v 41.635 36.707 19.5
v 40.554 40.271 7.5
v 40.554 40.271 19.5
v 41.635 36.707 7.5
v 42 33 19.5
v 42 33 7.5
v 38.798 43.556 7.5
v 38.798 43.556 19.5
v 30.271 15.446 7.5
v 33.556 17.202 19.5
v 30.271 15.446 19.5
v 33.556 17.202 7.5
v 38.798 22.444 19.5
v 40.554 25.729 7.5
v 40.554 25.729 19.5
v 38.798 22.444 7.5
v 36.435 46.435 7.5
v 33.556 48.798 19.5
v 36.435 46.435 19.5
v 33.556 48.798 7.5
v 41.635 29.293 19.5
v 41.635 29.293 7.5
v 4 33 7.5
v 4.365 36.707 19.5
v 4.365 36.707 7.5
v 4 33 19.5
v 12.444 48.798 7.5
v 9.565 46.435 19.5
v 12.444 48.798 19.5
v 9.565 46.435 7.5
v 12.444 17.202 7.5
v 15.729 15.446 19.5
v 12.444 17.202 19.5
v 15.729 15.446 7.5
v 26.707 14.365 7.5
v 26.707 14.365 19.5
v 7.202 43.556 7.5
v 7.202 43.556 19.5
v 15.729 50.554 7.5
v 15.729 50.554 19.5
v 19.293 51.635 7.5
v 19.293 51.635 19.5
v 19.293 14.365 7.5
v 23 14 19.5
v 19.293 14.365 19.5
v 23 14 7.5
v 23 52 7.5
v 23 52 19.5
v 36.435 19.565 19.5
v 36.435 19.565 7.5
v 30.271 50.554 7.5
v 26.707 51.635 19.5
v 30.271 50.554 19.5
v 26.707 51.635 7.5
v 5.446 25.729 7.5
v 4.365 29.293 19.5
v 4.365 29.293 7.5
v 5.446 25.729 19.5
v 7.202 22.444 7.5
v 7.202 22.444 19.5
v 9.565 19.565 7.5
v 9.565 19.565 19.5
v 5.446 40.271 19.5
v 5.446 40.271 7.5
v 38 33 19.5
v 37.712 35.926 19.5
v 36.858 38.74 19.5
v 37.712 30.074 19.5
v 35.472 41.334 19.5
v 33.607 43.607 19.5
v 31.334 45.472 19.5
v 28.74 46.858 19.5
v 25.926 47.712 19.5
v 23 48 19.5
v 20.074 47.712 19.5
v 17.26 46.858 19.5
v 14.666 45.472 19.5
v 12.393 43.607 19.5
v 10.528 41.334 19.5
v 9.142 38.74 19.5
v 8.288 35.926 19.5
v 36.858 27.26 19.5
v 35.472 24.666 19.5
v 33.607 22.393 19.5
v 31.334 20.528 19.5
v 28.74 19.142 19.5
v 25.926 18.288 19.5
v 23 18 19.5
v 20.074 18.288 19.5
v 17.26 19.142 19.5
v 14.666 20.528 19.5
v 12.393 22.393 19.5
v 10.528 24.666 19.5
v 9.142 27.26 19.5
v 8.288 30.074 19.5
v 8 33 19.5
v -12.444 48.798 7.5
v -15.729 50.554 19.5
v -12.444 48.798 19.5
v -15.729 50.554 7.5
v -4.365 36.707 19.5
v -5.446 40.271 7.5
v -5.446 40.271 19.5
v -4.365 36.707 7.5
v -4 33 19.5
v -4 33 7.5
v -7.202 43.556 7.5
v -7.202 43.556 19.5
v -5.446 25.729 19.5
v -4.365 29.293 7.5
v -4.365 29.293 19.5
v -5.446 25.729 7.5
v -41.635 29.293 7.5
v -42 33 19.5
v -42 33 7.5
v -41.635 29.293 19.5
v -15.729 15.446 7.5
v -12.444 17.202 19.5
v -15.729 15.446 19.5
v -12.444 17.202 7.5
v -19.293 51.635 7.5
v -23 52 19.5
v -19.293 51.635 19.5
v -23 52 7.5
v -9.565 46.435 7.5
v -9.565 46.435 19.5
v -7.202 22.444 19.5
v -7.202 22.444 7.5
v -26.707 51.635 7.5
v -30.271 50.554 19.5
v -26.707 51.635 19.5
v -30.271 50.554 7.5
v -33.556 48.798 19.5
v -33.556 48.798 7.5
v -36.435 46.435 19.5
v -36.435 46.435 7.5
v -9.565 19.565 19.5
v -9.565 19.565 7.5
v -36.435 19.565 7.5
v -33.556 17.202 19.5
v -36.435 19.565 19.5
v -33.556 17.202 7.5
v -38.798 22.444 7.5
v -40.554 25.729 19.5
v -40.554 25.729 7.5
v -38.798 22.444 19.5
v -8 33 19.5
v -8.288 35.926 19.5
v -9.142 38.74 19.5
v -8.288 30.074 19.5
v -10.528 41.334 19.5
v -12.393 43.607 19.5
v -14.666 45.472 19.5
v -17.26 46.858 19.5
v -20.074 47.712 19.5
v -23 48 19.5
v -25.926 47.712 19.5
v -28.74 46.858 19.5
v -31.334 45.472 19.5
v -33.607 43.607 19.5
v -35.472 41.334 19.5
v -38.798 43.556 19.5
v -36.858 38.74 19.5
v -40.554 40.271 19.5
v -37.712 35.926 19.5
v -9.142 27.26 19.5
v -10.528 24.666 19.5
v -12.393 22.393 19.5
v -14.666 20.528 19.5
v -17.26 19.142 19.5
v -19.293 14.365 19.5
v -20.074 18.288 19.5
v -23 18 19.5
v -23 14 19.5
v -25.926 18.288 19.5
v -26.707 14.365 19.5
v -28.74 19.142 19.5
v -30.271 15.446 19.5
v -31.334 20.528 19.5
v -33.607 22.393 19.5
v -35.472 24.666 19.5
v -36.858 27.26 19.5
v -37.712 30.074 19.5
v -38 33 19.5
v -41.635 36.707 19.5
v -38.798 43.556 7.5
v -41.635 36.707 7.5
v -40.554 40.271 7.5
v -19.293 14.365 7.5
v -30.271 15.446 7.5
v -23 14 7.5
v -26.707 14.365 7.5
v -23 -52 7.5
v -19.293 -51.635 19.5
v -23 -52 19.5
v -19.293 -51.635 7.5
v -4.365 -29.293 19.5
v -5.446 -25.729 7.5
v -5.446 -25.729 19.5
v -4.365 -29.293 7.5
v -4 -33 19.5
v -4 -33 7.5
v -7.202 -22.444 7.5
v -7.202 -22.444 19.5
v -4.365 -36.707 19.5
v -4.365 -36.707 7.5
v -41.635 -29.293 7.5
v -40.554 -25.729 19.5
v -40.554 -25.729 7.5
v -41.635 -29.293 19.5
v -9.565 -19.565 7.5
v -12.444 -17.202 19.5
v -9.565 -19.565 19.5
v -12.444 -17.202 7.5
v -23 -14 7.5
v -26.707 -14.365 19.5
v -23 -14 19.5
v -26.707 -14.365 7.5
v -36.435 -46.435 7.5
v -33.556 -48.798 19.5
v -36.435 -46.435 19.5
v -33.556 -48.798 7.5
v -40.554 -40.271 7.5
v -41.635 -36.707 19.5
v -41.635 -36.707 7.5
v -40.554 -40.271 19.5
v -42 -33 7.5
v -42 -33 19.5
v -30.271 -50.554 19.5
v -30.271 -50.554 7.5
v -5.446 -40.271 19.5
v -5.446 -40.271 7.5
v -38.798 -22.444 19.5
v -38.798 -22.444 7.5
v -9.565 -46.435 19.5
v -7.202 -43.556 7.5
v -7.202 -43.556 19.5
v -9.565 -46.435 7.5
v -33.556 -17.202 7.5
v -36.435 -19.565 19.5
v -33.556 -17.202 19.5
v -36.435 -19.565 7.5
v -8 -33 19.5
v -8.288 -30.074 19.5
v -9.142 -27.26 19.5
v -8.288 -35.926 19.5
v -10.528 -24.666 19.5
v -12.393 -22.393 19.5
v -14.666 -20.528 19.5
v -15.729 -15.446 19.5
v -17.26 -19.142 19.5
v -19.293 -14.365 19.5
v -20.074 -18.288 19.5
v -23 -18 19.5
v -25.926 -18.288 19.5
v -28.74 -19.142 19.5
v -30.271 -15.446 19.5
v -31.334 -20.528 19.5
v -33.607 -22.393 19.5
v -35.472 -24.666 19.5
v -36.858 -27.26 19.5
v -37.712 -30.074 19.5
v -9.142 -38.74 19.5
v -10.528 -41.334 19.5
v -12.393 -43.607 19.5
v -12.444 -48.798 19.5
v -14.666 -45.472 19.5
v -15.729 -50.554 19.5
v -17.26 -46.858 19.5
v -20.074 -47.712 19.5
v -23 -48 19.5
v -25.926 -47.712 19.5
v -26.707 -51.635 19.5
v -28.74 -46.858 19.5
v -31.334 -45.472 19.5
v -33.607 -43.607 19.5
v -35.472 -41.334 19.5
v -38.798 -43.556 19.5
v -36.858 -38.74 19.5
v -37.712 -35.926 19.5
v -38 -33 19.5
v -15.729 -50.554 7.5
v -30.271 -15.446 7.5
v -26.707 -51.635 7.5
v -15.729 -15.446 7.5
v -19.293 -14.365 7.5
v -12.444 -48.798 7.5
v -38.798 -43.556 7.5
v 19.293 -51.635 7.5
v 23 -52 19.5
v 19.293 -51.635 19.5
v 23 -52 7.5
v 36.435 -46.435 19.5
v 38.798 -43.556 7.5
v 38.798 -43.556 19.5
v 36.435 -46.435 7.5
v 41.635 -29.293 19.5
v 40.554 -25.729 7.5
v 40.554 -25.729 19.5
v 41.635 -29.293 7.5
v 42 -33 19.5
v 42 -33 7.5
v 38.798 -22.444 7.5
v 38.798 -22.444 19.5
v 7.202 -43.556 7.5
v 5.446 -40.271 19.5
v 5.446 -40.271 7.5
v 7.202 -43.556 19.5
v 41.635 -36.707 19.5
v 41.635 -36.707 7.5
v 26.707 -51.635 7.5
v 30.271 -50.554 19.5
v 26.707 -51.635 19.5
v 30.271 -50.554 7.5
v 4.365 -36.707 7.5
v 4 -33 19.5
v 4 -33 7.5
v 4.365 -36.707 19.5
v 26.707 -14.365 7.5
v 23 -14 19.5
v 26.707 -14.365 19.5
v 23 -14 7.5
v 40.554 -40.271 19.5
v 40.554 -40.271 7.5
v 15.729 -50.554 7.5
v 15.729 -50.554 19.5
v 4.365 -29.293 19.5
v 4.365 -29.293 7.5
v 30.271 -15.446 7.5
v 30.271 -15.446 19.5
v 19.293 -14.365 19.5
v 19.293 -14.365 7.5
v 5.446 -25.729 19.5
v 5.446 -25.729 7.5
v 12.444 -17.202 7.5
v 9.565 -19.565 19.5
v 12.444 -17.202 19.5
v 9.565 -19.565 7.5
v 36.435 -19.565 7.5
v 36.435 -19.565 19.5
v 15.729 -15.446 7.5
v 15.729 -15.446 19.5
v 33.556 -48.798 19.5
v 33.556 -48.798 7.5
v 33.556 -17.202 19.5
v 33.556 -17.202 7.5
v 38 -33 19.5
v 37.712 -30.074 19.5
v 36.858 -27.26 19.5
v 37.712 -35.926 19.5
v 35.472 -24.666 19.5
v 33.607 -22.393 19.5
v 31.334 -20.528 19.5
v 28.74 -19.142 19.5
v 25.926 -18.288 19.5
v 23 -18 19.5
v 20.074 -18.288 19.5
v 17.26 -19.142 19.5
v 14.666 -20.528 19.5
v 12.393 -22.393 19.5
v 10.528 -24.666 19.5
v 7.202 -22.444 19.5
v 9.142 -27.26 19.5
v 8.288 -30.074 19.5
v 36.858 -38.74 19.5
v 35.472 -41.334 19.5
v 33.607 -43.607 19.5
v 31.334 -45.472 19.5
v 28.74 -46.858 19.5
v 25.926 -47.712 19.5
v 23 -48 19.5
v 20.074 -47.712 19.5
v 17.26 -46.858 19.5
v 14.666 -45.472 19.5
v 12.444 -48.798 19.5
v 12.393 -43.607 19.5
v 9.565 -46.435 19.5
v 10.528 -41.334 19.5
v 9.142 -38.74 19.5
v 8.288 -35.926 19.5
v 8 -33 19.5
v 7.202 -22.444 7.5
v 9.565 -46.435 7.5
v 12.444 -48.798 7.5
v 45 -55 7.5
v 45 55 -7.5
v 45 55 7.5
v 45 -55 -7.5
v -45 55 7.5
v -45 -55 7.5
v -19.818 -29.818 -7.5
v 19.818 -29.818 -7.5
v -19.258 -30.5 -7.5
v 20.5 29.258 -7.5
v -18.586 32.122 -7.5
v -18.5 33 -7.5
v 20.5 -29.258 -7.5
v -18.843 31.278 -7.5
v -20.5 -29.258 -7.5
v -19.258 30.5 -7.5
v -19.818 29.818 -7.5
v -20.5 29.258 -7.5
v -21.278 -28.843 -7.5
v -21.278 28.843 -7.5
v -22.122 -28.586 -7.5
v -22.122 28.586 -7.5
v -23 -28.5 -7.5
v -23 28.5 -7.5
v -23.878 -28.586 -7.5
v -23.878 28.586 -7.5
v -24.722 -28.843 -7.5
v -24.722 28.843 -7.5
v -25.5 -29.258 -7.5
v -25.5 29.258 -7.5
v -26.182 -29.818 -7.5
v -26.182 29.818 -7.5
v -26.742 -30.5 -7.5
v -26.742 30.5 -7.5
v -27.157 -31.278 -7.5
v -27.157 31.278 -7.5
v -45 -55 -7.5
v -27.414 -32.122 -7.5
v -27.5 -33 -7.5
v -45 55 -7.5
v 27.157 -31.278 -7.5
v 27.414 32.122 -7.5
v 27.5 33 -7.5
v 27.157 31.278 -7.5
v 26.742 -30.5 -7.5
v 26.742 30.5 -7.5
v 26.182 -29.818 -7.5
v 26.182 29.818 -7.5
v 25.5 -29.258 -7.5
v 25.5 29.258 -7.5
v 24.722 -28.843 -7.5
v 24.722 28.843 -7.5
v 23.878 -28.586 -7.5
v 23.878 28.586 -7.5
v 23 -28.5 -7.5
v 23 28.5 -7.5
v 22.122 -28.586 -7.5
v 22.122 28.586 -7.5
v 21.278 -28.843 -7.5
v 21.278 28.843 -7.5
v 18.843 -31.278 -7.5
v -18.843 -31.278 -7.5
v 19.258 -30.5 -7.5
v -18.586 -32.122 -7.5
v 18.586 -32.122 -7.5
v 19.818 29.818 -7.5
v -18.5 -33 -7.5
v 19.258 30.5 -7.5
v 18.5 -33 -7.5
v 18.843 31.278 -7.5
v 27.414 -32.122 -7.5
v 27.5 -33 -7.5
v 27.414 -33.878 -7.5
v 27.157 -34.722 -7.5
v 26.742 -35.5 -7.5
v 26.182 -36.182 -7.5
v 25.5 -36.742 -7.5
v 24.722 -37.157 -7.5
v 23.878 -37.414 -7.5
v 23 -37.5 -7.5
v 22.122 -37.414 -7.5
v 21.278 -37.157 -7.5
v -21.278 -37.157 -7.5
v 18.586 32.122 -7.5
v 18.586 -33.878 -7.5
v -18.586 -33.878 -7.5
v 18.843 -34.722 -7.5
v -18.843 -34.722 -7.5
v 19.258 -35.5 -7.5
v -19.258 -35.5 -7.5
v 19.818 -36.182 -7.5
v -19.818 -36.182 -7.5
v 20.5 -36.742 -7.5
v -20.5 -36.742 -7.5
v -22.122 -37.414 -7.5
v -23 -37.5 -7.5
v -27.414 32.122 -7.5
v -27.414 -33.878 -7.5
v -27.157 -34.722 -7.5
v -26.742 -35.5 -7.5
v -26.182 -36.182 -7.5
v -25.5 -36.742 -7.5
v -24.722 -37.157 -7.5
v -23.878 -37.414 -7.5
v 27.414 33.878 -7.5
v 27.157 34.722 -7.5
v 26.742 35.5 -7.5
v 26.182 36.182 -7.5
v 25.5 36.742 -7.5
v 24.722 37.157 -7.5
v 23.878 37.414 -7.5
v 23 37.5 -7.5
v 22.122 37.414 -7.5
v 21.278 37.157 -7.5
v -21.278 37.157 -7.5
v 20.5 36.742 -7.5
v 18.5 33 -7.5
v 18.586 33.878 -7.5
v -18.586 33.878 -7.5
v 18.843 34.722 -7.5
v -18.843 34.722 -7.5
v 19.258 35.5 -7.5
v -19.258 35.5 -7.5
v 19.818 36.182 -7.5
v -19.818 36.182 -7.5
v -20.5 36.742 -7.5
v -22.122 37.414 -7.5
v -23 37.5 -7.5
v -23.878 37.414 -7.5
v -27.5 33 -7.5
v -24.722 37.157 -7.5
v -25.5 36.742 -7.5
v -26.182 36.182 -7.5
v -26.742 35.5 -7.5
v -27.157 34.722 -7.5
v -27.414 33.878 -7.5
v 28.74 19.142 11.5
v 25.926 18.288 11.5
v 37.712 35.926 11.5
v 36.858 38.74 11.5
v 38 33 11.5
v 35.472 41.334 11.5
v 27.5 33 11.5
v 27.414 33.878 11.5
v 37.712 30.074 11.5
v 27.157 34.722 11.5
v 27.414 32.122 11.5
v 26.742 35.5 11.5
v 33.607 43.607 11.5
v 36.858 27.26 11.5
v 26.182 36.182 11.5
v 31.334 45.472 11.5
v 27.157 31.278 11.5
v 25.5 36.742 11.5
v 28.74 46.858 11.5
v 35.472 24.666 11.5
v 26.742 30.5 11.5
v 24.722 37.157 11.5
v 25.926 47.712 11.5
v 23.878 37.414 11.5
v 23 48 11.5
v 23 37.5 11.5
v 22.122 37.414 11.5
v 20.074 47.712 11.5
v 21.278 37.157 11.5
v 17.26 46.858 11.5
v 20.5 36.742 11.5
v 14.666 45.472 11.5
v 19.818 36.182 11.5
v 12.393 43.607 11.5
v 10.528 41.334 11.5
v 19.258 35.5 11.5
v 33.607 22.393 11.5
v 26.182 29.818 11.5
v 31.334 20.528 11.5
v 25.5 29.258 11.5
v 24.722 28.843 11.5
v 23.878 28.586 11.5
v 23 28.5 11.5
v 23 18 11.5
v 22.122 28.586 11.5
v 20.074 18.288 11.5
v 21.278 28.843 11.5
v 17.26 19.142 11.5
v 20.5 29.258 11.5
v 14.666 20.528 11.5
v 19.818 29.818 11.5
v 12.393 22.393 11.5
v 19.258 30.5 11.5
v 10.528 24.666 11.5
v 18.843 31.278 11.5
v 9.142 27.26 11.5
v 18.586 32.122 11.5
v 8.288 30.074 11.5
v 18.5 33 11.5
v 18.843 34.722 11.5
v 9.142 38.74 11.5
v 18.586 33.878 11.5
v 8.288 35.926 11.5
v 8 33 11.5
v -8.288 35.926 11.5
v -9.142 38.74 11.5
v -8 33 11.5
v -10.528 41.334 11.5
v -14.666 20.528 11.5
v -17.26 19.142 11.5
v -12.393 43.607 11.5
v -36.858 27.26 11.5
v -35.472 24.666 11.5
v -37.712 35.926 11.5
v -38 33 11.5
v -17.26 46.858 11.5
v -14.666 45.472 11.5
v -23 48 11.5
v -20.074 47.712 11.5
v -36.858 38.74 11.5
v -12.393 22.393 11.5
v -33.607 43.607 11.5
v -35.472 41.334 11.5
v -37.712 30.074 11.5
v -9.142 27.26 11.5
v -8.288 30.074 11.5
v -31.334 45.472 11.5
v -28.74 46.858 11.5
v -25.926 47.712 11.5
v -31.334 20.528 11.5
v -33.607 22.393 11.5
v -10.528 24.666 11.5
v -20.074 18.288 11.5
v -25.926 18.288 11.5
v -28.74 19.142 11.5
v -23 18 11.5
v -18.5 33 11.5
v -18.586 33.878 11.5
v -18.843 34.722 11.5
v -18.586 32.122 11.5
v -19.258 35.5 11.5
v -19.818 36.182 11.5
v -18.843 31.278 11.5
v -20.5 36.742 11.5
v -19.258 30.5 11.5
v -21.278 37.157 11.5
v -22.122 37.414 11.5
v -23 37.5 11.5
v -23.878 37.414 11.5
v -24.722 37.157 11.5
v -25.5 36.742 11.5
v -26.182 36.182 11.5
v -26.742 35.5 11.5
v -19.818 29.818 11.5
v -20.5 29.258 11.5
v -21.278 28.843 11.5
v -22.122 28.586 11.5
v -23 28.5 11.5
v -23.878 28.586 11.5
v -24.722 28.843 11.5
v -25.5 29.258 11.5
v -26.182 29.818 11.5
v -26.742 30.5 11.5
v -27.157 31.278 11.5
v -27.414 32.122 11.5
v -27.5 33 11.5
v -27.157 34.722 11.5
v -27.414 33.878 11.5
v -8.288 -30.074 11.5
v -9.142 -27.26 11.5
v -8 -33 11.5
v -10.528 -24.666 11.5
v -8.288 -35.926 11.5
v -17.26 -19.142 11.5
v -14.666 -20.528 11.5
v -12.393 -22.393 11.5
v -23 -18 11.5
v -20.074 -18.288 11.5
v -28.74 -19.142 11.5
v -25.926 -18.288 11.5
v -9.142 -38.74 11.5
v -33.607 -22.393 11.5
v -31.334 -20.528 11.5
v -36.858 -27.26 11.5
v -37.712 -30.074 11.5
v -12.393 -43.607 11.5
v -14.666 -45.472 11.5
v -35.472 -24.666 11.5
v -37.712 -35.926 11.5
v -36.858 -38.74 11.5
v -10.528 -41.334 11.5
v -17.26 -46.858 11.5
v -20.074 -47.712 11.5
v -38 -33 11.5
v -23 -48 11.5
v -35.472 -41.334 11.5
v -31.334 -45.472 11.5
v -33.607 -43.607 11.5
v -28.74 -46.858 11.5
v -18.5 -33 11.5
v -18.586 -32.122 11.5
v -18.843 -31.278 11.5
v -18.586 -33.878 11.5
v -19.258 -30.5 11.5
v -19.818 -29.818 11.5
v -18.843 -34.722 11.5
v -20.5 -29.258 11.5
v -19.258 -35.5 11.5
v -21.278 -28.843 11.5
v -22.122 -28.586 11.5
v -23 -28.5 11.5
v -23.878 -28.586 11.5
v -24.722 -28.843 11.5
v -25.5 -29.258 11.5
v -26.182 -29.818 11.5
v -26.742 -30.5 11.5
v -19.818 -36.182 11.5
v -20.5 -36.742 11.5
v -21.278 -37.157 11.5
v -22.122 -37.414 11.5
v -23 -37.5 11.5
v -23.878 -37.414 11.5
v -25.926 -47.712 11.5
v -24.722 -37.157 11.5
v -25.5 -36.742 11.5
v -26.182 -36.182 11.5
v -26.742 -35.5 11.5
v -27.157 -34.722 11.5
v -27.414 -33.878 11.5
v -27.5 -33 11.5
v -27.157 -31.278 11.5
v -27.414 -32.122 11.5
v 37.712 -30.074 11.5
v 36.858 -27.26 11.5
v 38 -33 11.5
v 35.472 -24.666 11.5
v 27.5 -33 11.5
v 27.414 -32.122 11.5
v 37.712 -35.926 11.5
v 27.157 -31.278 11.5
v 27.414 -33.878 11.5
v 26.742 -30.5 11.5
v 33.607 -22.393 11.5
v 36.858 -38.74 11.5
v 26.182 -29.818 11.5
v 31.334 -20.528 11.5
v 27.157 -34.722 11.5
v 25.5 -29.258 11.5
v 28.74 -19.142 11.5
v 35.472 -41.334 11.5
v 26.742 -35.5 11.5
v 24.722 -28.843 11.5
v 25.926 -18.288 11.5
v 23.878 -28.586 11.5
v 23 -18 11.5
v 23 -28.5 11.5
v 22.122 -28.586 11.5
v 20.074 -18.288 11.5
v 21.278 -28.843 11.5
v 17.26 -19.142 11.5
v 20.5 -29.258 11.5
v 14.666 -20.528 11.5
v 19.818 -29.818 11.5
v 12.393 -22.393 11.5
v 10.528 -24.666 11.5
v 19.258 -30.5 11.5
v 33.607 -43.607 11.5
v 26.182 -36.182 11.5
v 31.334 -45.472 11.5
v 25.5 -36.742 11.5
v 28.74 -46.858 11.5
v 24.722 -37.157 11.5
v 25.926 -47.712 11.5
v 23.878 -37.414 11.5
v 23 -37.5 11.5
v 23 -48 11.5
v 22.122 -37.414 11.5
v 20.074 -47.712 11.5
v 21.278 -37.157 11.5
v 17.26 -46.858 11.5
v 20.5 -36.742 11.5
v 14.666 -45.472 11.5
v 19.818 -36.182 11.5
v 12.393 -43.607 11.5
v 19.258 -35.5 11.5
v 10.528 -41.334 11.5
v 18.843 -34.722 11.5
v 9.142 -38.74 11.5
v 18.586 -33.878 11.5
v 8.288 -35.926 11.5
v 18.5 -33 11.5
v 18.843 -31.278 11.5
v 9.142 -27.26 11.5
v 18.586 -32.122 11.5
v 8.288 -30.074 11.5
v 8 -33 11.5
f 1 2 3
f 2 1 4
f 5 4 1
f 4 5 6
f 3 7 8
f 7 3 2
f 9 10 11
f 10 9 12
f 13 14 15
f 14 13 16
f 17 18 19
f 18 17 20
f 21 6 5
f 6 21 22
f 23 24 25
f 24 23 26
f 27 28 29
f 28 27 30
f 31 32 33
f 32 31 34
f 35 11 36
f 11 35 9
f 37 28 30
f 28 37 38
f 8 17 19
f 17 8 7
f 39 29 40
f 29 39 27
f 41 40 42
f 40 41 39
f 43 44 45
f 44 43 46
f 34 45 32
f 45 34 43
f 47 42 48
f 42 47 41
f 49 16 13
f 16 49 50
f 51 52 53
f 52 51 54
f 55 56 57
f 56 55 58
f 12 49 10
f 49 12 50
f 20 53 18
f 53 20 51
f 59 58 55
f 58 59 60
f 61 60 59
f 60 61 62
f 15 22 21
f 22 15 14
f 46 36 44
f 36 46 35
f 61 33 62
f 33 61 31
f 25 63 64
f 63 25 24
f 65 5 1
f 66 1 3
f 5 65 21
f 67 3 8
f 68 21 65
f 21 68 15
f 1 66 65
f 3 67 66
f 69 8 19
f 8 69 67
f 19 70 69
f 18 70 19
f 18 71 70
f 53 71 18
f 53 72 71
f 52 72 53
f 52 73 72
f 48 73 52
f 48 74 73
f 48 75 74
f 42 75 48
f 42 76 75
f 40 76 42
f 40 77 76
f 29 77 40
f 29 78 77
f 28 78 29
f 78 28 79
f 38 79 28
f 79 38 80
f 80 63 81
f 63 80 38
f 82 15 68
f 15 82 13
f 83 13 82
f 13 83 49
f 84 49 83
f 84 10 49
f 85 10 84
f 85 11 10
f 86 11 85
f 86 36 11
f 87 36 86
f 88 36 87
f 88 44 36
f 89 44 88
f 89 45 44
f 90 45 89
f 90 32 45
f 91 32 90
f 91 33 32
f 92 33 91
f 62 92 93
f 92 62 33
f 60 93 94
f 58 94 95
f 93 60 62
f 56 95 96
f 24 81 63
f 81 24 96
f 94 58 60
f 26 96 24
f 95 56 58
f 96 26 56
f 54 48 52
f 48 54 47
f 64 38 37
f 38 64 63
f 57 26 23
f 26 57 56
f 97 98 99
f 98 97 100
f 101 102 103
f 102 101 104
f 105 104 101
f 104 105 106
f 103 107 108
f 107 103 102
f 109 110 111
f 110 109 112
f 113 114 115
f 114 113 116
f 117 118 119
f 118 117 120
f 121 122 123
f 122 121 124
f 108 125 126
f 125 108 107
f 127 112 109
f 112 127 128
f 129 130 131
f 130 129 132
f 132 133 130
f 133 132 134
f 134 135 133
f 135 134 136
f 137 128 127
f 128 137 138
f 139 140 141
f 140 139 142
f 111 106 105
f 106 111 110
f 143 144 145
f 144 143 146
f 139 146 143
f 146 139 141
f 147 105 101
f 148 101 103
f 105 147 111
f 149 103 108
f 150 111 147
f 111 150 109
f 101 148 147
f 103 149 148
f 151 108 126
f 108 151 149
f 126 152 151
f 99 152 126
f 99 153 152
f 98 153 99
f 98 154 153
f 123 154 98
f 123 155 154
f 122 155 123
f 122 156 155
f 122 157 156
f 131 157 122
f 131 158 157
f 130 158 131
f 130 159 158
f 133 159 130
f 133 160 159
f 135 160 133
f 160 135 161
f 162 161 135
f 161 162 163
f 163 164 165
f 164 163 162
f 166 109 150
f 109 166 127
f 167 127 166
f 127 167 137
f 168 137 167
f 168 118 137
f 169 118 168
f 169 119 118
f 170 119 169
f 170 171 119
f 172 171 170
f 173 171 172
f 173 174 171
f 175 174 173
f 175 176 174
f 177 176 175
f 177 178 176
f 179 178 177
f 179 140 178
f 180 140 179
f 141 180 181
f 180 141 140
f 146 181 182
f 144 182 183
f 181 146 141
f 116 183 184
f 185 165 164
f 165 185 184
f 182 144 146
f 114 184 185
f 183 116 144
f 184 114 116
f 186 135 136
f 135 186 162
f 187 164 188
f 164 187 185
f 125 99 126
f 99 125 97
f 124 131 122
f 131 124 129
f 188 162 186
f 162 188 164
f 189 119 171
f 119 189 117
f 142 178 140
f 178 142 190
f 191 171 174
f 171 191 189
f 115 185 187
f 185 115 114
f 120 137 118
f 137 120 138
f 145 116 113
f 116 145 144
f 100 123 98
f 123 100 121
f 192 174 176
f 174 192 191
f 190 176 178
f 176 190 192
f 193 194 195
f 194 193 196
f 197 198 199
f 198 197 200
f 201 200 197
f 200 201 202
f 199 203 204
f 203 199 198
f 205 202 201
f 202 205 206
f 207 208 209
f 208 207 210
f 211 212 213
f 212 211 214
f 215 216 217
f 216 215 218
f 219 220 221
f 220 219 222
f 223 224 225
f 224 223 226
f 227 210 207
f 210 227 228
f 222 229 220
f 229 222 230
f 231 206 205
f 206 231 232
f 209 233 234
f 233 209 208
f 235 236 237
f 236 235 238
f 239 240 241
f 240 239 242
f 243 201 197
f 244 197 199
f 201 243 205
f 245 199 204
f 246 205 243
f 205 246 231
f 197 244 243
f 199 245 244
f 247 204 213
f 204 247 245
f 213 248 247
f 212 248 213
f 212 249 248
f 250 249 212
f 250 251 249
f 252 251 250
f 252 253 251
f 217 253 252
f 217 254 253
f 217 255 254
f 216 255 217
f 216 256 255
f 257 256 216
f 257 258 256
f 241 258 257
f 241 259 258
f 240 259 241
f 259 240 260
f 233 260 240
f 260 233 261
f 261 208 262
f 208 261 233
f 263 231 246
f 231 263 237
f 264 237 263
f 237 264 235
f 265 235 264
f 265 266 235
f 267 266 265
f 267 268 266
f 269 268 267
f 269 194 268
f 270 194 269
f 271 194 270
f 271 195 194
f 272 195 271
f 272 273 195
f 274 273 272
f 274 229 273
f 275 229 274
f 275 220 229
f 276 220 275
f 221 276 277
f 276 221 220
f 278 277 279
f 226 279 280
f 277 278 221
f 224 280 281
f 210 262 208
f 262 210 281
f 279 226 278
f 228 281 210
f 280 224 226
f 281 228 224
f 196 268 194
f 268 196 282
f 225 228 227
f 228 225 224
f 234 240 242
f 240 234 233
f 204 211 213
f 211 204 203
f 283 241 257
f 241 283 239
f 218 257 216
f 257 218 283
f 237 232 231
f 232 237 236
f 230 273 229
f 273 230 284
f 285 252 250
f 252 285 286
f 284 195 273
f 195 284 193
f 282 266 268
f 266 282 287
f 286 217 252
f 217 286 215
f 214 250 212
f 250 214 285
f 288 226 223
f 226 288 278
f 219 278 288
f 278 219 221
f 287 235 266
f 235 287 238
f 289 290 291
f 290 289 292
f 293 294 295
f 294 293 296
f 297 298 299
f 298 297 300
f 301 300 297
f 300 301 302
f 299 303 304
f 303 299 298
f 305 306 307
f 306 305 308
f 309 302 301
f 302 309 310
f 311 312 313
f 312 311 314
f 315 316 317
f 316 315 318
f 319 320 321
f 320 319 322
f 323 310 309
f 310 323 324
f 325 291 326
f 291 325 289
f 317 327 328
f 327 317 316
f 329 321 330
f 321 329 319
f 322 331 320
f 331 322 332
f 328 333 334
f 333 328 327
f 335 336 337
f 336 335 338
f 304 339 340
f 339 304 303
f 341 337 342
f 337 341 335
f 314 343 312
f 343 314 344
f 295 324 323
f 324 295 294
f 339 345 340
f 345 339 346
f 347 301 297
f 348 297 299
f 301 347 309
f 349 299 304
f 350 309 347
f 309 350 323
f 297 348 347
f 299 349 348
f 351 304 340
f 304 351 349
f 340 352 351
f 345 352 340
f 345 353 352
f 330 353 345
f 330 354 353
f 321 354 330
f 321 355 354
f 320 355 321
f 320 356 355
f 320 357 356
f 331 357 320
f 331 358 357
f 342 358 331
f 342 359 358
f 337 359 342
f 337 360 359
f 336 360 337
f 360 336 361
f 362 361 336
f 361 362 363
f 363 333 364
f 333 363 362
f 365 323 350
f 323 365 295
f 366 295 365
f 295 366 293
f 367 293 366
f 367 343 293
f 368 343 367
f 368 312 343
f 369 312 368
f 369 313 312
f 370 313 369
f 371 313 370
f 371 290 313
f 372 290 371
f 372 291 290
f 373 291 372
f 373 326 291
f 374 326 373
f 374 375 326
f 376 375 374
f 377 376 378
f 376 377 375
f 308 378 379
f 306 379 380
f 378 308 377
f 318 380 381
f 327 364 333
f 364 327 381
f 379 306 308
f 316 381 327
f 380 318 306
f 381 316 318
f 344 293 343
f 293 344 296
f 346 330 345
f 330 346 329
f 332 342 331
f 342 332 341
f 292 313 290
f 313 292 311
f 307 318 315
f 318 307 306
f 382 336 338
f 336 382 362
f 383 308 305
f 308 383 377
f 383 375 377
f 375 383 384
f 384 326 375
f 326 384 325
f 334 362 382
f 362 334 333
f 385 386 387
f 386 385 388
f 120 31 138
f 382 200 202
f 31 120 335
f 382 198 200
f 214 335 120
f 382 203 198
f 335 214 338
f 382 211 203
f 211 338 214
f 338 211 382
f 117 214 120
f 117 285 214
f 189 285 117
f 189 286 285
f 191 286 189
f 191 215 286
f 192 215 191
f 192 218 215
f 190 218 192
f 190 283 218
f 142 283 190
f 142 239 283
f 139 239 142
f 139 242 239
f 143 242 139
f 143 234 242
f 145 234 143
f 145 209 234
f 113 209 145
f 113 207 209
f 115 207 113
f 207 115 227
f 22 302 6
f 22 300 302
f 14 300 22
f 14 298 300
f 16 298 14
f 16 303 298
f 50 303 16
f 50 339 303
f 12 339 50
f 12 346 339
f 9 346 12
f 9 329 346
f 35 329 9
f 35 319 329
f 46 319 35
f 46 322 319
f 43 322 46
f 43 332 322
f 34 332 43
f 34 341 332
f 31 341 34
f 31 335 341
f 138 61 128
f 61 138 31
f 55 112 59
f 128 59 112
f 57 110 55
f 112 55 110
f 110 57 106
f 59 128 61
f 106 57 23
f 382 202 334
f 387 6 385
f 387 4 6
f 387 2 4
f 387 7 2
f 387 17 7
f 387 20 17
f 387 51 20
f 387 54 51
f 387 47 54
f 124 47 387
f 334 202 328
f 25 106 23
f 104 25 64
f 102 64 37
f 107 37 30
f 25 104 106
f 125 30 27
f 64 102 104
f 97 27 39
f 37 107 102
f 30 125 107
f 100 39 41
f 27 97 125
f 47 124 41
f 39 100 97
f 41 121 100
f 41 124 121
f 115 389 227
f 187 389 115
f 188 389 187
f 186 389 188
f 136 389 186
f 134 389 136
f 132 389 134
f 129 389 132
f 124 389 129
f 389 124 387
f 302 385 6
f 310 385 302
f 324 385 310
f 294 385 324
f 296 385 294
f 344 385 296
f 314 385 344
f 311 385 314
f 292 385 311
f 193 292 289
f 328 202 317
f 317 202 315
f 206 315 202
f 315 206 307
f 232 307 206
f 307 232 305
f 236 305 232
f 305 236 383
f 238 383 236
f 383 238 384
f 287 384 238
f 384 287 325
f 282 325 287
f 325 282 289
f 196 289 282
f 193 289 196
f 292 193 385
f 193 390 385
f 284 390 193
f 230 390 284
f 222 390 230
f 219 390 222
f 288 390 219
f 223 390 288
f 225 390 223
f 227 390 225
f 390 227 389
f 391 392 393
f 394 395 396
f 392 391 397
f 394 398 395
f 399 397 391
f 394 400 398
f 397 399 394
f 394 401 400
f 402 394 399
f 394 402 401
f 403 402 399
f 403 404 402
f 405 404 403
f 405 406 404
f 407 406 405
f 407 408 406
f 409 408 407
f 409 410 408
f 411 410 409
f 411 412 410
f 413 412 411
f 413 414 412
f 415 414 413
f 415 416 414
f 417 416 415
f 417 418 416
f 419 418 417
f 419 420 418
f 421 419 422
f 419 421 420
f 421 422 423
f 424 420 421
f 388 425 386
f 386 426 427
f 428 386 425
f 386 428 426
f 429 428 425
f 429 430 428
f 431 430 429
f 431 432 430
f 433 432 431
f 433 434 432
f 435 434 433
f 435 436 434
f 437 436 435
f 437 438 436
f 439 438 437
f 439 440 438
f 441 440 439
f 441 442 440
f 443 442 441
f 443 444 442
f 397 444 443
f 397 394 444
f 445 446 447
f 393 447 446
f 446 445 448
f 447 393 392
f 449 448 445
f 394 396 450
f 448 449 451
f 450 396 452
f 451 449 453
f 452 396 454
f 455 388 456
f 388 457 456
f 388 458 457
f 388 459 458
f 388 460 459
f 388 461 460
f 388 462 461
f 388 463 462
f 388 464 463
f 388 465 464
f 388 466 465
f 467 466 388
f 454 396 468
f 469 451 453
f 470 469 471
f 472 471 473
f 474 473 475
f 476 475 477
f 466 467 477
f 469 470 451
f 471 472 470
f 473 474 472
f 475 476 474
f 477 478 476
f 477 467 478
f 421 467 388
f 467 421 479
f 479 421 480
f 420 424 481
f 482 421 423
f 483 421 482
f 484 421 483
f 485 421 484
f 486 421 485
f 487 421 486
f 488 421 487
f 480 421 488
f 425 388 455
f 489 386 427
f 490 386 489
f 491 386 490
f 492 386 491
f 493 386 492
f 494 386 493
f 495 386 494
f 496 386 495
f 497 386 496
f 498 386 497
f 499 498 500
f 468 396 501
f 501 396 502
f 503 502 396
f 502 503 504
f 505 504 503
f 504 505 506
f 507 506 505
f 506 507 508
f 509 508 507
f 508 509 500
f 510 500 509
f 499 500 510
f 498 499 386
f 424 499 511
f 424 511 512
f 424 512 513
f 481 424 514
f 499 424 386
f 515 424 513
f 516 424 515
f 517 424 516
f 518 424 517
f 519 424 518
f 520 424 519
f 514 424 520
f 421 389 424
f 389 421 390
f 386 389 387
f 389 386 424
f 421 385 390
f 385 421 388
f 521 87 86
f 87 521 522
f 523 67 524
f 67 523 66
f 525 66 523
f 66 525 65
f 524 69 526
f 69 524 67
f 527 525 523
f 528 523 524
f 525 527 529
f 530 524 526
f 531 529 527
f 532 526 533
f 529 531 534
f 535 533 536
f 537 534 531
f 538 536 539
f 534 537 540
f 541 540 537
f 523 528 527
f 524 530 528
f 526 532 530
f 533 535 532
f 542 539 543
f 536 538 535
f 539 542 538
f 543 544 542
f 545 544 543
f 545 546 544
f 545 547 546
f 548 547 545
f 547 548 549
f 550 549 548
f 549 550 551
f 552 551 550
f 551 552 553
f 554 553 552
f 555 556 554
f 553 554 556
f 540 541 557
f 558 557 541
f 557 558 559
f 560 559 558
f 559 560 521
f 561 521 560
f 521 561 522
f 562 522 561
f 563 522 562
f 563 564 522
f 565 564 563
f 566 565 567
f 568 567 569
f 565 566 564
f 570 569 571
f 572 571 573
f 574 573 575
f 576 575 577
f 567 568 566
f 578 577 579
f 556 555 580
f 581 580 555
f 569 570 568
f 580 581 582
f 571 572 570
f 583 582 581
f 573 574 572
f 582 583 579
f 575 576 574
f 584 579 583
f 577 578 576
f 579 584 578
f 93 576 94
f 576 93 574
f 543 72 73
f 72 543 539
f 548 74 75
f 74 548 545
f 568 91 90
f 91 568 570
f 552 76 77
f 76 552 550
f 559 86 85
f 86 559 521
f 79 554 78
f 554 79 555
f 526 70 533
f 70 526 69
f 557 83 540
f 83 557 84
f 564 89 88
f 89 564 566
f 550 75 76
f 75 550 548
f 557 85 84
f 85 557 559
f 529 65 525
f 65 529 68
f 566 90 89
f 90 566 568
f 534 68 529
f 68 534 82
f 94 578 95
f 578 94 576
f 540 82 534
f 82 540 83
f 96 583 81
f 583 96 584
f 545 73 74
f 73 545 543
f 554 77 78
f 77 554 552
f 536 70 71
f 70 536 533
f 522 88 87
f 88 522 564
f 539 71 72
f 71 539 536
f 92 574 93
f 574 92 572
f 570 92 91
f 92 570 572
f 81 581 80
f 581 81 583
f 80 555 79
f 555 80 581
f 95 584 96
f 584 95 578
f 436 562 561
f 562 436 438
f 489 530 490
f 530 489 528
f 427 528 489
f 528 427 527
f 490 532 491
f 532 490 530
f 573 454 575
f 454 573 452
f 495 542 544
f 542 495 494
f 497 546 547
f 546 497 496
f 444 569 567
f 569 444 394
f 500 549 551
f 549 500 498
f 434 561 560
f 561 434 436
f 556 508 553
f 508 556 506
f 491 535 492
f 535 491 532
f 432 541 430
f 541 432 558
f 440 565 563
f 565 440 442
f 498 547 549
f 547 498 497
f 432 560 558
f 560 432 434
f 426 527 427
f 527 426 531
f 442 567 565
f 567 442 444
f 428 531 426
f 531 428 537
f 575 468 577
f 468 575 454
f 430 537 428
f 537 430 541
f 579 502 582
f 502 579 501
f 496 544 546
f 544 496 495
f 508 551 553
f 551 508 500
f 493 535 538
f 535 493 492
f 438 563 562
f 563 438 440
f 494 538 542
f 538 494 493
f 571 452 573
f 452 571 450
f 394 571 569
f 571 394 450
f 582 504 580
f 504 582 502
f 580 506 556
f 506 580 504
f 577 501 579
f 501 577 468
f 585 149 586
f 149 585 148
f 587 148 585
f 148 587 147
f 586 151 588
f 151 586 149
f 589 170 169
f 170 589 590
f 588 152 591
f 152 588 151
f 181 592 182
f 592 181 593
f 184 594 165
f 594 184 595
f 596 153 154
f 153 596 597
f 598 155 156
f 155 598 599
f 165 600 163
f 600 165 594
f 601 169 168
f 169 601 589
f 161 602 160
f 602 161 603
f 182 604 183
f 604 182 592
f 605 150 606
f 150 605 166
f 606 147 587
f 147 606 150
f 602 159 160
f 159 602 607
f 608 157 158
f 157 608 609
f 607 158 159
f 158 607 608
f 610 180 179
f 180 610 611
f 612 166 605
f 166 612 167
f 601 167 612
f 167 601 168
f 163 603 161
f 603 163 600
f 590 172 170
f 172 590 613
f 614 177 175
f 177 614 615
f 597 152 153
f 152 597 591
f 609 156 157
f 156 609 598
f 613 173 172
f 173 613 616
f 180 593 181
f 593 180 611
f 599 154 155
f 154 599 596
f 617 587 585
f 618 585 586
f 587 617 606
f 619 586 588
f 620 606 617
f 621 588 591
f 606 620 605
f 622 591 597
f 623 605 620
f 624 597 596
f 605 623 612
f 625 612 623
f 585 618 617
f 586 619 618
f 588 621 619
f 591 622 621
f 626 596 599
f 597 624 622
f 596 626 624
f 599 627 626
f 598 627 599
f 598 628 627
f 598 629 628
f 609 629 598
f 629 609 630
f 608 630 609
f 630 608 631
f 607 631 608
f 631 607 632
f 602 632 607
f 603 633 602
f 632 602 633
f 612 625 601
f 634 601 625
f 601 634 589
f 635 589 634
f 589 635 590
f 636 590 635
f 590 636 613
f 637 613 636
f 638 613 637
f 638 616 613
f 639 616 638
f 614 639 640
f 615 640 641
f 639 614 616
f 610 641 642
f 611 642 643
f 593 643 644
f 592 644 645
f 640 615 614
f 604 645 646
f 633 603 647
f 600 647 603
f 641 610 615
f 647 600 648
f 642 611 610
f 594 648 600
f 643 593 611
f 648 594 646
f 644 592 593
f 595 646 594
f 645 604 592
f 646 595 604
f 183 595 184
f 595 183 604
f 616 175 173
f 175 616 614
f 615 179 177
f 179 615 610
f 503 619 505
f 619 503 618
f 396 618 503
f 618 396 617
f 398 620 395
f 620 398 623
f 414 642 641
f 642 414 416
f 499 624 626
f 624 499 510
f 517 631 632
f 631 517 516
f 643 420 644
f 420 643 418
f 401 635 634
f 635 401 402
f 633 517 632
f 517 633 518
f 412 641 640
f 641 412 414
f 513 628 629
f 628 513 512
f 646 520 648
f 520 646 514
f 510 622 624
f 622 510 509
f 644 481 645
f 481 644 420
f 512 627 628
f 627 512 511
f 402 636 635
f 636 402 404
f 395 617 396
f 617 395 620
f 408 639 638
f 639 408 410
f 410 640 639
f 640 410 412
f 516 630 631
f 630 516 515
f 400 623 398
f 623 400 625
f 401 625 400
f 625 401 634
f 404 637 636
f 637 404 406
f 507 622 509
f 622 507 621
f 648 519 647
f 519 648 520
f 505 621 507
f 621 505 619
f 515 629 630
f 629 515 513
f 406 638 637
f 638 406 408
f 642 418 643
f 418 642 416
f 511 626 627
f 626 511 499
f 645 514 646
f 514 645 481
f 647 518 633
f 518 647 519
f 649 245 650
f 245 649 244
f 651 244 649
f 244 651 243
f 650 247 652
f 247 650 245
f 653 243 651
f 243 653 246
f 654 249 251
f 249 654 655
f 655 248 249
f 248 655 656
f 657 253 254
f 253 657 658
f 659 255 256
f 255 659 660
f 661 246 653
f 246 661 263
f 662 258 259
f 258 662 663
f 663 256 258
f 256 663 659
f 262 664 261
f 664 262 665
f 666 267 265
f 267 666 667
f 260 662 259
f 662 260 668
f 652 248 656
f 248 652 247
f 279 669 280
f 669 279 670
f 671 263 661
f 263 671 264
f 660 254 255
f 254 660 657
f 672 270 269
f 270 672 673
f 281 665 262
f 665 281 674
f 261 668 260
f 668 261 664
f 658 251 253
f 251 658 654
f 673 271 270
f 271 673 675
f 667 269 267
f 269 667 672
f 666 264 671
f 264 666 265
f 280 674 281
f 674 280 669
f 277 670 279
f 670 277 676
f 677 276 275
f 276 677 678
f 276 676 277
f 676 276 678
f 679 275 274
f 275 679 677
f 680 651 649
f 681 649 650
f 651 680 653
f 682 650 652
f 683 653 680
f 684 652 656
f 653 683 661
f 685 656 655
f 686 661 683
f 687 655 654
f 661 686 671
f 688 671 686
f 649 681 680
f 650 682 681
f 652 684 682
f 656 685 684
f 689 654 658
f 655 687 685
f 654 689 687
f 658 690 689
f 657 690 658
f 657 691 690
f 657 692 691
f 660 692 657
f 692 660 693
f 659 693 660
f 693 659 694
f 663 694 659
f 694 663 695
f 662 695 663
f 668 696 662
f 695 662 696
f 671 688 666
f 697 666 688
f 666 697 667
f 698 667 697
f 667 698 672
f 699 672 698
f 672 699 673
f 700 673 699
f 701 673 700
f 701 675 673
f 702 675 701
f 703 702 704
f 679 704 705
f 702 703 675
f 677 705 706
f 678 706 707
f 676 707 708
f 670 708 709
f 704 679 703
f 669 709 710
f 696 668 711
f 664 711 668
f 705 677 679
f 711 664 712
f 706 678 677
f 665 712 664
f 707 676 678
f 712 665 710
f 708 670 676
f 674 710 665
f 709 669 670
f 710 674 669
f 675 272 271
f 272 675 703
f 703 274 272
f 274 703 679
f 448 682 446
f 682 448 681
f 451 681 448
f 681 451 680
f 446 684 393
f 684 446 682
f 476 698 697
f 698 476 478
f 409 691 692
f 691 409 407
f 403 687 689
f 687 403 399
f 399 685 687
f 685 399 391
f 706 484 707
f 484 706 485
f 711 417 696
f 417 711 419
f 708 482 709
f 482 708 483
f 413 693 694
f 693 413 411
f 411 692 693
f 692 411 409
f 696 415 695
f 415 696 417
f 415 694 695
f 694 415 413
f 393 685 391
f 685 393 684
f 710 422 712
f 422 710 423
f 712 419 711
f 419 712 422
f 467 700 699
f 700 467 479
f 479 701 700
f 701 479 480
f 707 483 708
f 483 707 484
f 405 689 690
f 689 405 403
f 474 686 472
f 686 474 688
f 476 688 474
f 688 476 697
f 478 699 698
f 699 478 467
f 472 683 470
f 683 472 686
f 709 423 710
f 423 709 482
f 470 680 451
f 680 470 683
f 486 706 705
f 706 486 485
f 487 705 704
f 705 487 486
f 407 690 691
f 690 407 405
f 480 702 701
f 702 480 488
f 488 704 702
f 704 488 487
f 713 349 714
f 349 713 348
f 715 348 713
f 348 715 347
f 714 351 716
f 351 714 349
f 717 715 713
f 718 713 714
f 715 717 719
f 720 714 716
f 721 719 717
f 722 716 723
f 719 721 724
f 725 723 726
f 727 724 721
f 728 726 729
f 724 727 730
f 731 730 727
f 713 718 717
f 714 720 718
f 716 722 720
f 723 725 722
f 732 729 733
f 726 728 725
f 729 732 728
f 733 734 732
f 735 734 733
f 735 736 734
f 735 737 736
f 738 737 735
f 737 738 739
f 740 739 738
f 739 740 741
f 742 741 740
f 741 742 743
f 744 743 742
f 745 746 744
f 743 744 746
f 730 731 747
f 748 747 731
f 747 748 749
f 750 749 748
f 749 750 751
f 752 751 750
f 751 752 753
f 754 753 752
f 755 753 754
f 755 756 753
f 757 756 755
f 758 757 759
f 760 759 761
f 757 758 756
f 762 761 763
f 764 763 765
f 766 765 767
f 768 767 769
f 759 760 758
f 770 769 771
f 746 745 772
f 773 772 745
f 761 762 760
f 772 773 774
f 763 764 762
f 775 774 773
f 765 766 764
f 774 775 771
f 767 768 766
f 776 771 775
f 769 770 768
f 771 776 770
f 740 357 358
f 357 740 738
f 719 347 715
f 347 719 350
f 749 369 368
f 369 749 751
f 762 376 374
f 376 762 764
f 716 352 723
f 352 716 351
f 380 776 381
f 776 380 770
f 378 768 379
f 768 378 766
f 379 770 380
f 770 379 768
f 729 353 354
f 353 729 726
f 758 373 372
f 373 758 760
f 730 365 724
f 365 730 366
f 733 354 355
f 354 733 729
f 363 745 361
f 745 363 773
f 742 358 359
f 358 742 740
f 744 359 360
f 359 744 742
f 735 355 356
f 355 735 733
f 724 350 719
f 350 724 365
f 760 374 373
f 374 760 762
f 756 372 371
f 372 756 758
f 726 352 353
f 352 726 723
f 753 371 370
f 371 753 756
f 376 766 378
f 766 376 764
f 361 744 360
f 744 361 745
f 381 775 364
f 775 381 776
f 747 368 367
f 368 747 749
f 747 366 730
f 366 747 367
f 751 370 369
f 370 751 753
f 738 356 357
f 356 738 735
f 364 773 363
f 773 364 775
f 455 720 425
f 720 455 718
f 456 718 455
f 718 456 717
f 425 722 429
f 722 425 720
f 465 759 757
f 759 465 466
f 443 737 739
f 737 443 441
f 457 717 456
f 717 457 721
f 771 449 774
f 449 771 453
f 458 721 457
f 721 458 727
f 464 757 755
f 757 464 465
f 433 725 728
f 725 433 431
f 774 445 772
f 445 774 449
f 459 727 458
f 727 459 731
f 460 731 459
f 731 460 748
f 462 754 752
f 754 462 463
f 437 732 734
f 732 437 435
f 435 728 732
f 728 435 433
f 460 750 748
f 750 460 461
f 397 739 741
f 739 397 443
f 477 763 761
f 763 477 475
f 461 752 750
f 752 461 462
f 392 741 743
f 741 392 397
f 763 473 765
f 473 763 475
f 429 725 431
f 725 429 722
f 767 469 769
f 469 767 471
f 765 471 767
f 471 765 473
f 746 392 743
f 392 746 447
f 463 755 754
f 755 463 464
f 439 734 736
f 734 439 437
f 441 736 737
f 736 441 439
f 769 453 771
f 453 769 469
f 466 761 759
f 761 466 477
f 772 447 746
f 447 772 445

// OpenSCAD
$fn = 32;

// ----------------------------------------------------------------------
// Socket pad plate
// bosses with counterbored sockets for the screws
// ----------------------------------------------------------------------

// --- parameters (mm) ---
base_t = 15;            // base plate thickness
boss_h = 12;            // boss height above the base plate
boss_d = 38;            // boss diameter
socket_d = 30;          // socket diameter
socket_depth = 8;       // socket depth from the boss face
bolt_d = 9;             // screw clearance hole through the socket floor
plate = [90, 110, 15];  // overall size (x, y, z)
edge = 22;              // boss centre offset from the plate edge
pads = 4;               // boss count, one per corner

// --- derived feature positions (mm) ---
height = base_t + boss_h;        // = 27   overall height of the part
corner_x = plate[0] / 2 - edge;  // = 23   boss centre X
corner_y = plate[1] / 2 - edge;  // = 33   boss centre Y
feature_centers = [
  [corner_x, corner_y],
  [-corner_x, corner_y],
  [-corner_x, -corner_y],
  [corner_x, -corner_y]
];   // boss centres: sockets, holes and the pads themselves are placed from here

// base plate, bosses on feature_centers, socket + through hole in each
difference() {
  union() {
    cube(plate, center = true);
    for (centre = feature_centers)
      translate([centre[0], centre[1], plate[2] / 2 - 1])
        cylinder(d = boss_d, h = boss_h + 1);
  }
  for (centre = feature_centers) {
    translate([centre[0], centre[1], plate[2] / 2 + boss_h - socket_depth])
      cylinder(d = socket_d, h = socket_depth + 1);
    translate([centre[0], centre[1], -height])
      cylinder(d = bolt_d, h = 2 * height + 2);  // through the socket floor
  }
}
